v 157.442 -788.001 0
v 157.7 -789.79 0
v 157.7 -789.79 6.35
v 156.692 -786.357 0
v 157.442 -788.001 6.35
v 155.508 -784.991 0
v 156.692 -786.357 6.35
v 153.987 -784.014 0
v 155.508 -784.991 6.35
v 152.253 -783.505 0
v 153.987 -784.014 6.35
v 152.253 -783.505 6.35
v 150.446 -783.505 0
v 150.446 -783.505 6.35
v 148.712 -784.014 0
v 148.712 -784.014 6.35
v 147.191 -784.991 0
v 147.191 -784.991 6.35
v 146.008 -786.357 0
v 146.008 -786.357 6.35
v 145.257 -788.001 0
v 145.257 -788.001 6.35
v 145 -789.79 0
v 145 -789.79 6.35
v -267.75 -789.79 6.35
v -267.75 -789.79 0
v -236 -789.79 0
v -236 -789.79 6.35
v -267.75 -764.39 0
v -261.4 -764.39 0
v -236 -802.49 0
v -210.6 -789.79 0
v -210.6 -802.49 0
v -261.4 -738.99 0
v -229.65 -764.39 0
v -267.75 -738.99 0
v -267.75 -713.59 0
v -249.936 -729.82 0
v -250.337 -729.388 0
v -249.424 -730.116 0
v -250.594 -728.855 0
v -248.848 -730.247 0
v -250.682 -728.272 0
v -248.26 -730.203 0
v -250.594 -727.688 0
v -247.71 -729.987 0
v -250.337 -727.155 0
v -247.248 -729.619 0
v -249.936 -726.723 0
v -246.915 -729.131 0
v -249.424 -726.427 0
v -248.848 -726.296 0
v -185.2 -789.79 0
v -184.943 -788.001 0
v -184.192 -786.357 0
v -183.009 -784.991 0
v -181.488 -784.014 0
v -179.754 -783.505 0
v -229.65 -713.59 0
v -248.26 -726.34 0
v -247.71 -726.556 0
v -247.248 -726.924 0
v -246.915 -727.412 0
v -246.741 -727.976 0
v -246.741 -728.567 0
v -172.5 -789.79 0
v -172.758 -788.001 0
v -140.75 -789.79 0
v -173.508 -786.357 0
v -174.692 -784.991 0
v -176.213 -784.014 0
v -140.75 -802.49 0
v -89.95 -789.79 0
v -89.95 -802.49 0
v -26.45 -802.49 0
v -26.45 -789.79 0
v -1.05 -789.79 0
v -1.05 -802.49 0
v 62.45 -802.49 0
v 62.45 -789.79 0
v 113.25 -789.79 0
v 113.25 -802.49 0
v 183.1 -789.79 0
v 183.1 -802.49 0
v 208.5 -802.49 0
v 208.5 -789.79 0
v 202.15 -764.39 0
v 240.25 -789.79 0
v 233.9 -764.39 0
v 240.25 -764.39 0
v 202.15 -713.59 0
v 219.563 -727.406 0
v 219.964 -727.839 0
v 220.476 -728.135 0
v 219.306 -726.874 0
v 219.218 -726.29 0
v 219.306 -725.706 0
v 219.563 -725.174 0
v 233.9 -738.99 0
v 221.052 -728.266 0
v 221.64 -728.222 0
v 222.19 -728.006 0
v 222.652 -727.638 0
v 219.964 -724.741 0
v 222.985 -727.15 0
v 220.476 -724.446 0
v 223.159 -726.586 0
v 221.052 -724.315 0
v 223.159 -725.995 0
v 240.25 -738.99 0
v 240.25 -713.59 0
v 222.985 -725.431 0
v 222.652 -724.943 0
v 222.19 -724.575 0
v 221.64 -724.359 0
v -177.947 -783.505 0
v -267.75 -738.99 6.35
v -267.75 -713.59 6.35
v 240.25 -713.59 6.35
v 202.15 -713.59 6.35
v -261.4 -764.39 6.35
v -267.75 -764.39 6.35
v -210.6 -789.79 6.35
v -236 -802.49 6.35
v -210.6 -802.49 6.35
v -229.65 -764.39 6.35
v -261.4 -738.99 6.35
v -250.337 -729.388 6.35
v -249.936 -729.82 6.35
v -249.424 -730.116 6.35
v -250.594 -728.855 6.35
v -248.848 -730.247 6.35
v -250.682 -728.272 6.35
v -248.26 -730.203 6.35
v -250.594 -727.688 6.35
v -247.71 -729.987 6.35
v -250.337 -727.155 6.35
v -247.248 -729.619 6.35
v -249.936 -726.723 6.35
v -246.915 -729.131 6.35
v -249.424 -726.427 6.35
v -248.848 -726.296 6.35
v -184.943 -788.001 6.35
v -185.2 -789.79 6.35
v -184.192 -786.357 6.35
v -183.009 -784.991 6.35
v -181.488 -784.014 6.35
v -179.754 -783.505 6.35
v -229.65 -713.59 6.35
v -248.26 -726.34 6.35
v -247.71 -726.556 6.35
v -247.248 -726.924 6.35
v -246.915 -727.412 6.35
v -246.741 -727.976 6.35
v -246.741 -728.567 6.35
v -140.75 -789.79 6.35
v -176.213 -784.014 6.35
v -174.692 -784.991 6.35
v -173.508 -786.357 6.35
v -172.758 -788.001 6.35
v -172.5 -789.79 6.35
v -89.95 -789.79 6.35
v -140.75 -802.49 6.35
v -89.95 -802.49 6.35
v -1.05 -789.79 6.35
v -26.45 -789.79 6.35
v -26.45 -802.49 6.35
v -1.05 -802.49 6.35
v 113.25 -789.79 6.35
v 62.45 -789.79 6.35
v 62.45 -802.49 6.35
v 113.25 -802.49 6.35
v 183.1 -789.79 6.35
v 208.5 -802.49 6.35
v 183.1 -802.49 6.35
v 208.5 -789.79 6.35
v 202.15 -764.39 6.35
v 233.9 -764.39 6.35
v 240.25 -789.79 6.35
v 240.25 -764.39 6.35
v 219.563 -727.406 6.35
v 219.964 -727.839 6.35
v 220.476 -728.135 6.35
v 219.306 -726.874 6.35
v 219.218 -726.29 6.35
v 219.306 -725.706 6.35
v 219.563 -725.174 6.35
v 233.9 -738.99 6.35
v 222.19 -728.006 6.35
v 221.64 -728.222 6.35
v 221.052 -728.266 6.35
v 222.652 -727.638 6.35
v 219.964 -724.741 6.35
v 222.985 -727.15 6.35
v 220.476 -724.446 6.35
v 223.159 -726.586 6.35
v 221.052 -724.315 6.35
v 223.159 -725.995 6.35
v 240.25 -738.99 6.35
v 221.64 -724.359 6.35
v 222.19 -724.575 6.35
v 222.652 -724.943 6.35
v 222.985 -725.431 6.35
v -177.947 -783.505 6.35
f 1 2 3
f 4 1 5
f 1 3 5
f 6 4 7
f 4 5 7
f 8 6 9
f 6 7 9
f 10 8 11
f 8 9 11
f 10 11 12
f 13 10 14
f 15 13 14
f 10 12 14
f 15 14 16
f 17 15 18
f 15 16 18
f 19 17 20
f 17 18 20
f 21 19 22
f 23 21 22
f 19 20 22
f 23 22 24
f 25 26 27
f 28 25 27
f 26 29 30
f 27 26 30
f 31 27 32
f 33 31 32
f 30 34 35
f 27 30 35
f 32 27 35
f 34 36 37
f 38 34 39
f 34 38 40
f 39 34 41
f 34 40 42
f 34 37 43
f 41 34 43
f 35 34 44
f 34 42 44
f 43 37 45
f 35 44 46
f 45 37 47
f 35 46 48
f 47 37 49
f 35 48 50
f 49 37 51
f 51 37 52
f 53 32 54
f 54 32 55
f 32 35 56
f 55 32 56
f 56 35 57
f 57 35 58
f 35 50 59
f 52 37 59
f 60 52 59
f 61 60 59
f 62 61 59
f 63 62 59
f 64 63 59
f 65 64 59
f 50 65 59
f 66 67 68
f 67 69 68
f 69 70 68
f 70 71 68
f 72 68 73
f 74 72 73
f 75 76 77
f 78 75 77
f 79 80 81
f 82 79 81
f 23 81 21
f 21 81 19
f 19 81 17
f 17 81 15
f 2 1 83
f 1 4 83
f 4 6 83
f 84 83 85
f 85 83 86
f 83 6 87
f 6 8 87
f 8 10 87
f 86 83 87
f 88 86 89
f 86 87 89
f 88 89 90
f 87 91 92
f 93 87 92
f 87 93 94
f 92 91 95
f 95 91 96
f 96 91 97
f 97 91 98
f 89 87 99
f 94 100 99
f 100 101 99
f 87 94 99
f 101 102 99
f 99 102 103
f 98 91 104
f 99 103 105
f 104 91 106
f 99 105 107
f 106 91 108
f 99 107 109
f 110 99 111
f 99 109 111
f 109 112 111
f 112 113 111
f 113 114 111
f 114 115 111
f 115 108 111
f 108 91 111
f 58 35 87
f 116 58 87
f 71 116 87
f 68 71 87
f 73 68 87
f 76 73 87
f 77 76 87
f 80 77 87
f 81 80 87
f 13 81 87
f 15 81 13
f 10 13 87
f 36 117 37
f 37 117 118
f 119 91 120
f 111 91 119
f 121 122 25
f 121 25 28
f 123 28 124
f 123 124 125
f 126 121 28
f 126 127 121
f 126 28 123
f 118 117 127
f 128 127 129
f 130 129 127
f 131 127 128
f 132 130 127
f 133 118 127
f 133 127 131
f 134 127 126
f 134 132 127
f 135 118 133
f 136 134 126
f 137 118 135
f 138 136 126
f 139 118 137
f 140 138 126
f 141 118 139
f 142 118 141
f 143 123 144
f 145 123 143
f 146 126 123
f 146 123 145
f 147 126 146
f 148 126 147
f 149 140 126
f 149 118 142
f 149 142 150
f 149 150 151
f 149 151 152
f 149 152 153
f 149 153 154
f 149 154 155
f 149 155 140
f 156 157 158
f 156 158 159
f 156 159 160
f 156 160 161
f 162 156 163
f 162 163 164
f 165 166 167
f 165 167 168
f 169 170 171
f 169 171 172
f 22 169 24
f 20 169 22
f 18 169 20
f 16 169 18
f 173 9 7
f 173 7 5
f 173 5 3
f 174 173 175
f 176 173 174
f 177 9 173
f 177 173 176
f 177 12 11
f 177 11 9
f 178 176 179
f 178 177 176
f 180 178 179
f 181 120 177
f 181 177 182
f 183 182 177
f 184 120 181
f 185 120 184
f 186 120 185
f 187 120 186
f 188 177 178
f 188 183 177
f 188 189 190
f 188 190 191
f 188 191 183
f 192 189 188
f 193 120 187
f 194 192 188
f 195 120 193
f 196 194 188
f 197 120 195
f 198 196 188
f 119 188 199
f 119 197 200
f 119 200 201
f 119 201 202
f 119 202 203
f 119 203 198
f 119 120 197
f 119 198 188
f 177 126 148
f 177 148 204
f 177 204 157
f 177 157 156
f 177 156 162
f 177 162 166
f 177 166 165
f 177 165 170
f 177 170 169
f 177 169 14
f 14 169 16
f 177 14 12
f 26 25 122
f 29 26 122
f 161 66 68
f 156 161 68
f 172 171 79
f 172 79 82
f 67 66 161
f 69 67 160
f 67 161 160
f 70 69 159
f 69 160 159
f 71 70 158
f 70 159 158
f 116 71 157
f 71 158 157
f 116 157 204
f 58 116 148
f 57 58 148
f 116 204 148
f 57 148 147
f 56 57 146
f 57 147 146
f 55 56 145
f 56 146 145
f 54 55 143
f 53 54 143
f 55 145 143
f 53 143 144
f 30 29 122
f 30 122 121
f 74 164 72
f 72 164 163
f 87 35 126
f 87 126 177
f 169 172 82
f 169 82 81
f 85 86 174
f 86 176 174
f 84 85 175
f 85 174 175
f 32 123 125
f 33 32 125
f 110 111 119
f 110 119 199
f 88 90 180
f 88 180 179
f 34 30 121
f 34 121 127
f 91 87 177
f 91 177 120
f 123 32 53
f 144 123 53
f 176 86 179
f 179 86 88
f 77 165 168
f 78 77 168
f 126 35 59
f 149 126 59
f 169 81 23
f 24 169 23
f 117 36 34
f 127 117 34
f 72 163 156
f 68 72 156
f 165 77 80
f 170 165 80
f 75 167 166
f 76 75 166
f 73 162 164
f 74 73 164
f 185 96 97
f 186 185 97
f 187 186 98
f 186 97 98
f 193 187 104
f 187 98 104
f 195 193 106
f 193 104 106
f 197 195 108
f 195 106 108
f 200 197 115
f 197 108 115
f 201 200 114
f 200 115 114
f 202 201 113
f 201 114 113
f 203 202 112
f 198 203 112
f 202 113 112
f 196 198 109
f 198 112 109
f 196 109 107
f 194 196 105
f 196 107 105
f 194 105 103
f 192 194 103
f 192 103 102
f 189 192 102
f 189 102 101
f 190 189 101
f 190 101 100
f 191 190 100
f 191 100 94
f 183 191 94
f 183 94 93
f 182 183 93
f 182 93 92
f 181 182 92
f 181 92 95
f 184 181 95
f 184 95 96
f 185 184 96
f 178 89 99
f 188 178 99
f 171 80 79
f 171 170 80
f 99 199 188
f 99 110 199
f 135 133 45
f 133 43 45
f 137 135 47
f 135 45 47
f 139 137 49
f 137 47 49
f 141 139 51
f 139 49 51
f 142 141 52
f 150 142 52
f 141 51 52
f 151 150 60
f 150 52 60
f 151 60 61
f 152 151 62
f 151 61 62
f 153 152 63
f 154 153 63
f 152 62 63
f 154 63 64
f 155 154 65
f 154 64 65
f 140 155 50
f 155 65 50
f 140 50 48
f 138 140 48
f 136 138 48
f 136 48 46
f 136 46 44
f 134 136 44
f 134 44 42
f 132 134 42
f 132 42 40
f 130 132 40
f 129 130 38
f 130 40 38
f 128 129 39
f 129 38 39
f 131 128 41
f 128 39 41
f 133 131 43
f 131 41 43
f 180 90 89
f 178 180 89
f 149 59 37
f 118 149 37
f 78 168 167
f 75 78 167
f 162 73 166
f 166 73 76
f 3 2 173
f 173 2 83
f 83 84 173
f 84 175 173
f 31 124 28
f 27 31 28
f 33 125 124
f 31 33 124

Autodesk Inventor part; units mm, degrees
ref_plane "YZ Plane" through (0, 0, 0) normal (1, 0, 0) x (0, 1, 0)
ref_plane "XZ Plane" through (0, 0, 0) normal (0, 1, 0) x (-1, 0, 0)
ref_plane "XY Plane" through (0, 0, 0) normal (0, 0, 1) x (1, 0, 0)
sketch "Sketch1" plane through (0, 0, 0) normal (0, 0, 1) x (1, 0, 0)
  line L0 (-267.7504, 67.4597) -> (240.2496, 67.4597)
  line L1 (240.2496, 67.4597) -> (240.2496, -986.6403)
  line L2 (240.2496, -986.6403) -> (-267.7504, -986.6403)
  line L3 (-267.7504, -986.6403) -> (-267.7504, 67.4597)
  point P0 (0, 0)
  dimension "d0" = 508
  dimension "d1" = 1054.1
extrude "Extrusion1" add sketch "Sketch1" along normal blind 6.35
sketch "Sketch2" plane through (0, 0, 6.35) normal (0, 0, 1) x (1, 0, 0)
  line L0 (240.2496, -986.6403) -> (-267.7504, -986.6403) projected
  line L1 (-267.7504, -986.6403) -> (-13.7504, -986.6403)
  line L2 (-13.7504, -986.6403) -> (-13.7504, -980.2903)
  line L3 (-13.7504, -980.2903) -> (1.4896, -980.2903)
  line L4 (1.4896, -980.2903) -> (-28.9904, -980.2903)
  line L5 (-28.9904, -980.2903) -> (1.4896, -980.2903)
  line L6 (1.4896, -980.2903) -> (1.4896, -973.9403)
  line L7 (1.4896, -973.9403) -> (-28.9904, -973.9403)
  line L8 (-28.9904, -973.9403) -> (-28.9904, -980.2903)
  point P0 (0, 0)
  dimension "d4" = 254
  dimension "d5" = 6.35
  dimension "d6" = 15.24
  dimension "d7" = 30.48
  dimension "d8" = 6.35
extrude "Extrusion2" cut sketch "Sketch2" against normal blind 104.14
sketch "Sketch3" plane through (0, 0, 6.35) normal (0, 0, 1) x (1, 0, 0)
  line L0 (240.2496, -986.6403) -> (-267.7504, -986.6403) projected
  line L1 (1.4896, -980.2903) -> (14.1896, -980.2903)
  line L2 (-28.9904, -980.2903) -> (-41.6904, -980.2903)
  line L3 (-41.6904, -980.2903) -> (-67.0904, -980.2903)
  line L4 (-67.0904, -980.2903) -> (-67.0904, -973.9403)
  line L5 (-67.0904, -973.9403) -> (-41.6904, -973.9403)
  line L6 (-41.6904, -973.9403) -> (-41.6904, -980.2903)
  line L7 (14.1896, -980.2903) -> (39.5896, -980.2903)
  line L8 (39.5896, -980.2903) -> (39.5896, -973.9403)
  line L9 (39.5896, -973.9403) -> (14.1896, -973.9403)
  line L10 (14.1896, -973.9403) -> (14.1896, -980.2903)
  point P0 (0, 0)
  dimension "d11" = 12.7
  dimension "d12" = 12.7
  dimension "d13" = 25.4
  dimension "d14" = 25.4
extrude "Extrusion3" cut sketch "Sketch3" against normal blind 104.14
sketch "Sketch4" plane through (0, 0, 6.35) normal (0, 0, 1) x (1, 0, 0)
  line L0 (-67.0904, -973.9403) -> (-41.6904, -973.9403) projected
  line L1 (14.1896, -973.9403) -> (39.5896, -973.9403) projected
  line L2 (-28.9904, -973.9403) -> (1.4896, -973.9403) projected
  line L3 (240.2496, 67.4597) -> (240.2496, -986.6403) projected
  line L4 (-267.7504, -986.6403) -> (-267.7504, 67.4597) projected
  line L5 (240.2496, -986.6403) -> (-267.7504, -986.6403) projected
  line L6 (-67.0904, -980.2903) -> (-92.4904, -980.2903)
  line L7 (-92.4904, -980.2903) -> (-117.8904, -980.2903)
  line L8 (-117.8904, -980.2903) -> (-117.8904, -986.6403)
  line L9 (39.5896, -980.2903) -> (64.9896, -980.2903)
  line L10 (64.9896, -980.2903) -> (90.3896, -980.2903)
  line L11 (90.3896, -980.2903) -> (90.3896, -986.6403)
  line L12 (-41.6904, -973.9403) -> (-28.9904, -973.9403)
  line L13 (1.4896, -973.9403) -> (14.1896, -973.9403)
  line L14 (-67.0904, -973.9403) -> (-79.7904, -973.9403)
  line L15 (39.5896, -973.9403) -> (52.2896, -973.9403)
  line L16 (-79.7904, -973.9403) -> (-79.7904, -802.4903)
  line L17 (52.2896, -973.9403) -> (52.2896, -802.4903)
  line L18 (52.2896, -802.4903) -> (-79.7904, -802.4903)
  line L19 (-79.7904, -802.4903) -> (-105.1904, -802.4903)
  line L20 (-105.1904, -802.4903) -> (-105.1904, -815.1903)
  line L21 (-105.1904, -815.1903) -> (-92.4904, -815.1903)
  line L22 (-92.4904, -815.1903) -> (-92.4904, -980.2903)
  line L23 (64.9896, -980.2903) -> (64.9896, -815.1903)
  line L24 (64.9896, -815.1903) -> (77.6896, -815.1903)
  line L25 (77.6896, -815.1903) -> (77.6896, -802.4903)
  line L26 (77.6896, -802.4903) -> (52.2896, -802.4903)
  line L27 (-105.1904, -802.4903) -> (-267.7504, -802.4903)
  line L28 (77.6896, -802.4903) -> (240.2496, -802.4903)
  point P0 (0, 0)
  dimension "d17" = 25.4
  dimension "d18" = 25.4
  dimension "d19" = 25.4
  dimension "d20" = 25.4
  dimension "d21" = 171.45
  dimension "d22" = 25.4
  dimension "d23" = 12.7
extrude "Extrusion4" cut sketch "Sketch4" against normal blind 104.14 contours L14 L16 L18 L17 L15 L1 L13 L2 L12 L0 | L20 L21 L22 L7 L8 L5 L4 L27 | L28 L3 L5 L11 L10 L23 L24 L25
sketch "Sketch5" plane through (0, 0, 6.35) normal (0, 0, 1) x (1, 0, 0)
  line L0 (-92.4904, -815.1903) -> (-92.4904, -980.2903) projected
  line L1 (64.9896, -980.2903) -> (64.9896, -815.1903) projected
  line L2 (-92.4904, -973.9403) -> (-92.4904, -967.5903)
  line L3 (-92.4904, -967.5903) -> (-105.1904, -967.5903)
  line L4 (-105.1904, -967.5903) -> (-105.1904, -954.8903)
  line L5 (-105.1904, -954.8903) -> (-92.4904, -954.8903)
  line L6 (64.9896, -954.8903) -> (77.6896, -954.8903)
  line L7 (77.6896, -954.8903) -> (77.6896, -967.5903)
  line L8 (77.6896, -967.5903) -> (64.9896, -967.5903)
  point P0 (0, 0)
  dimension "d26" = 6.35
  dimension "d27" = 12.7
extrude "Extrusion5" add sketch "Sketch5" against normal blind 6.35
sketch "Sketch6" plane through (0, 0, 6.35) normal (0, 0, 1) x (1, 0, 0)
  line L0 (-79.7904, -802.4903) -> (52.2896, -802.4903) projected
  line L1 (-267.7504, -802.4903) -> (-105.1904, -802.4903) projected
  line L2 (77.6896, -802.4903) -> (240.2496, -802.4903) projected
  line L3 (-267.7504, -802.4903) -> (-242.3504, -802.4903)
  line L4 (-242.3504, -802.4903) -> (-216.9504, -802.4903)
  line L5 (-216.9504, -802.4903) -> (-140.7504, -802.4903)
  line L6 (-140.7504, -802.4903) -> (-115.3504, -802.4903)
  line L7 (-115.3504, -802.4903) -> (-39.1504, -802.4903)
  line L8 (-39.1504, -802.4903) -> (-13.7504, -802.4903)
  line L9 (-13.7504, -802.4903) -> (62.4496, -802.4903)
  line L10 (62.4496, -802.4903) -> (87.8496, -802.4903)
  line L11 (87.8496, -802.4903) -> (164.0496, -802.4903)
  line L12 (164.0496, -802.4903) -> (189.4496, -802.4903)
  line L13 (189.4496, -802.4903) -> (265.6496, -802.4903)
  line L14 (265.6496, -802.4903) -> (240.2496, -802.4903)
  line L15 (-242.3504, -802.4903) -> (-216.9504, -802.4903)
  line L16 (-216.9504, -802.4903) -> (-216.9504, -796.1403)
  line L17 (-216.9504, -796.1403) -> (-242.3504, -796.1403)
  line L18 (-242.3504, -796.1403) -> (-242.3504, -802.4903)
  line L19 (-140.7504, -802.4903) -> (-115.3504, -802.4903)
  line L20 (-115.3504, -802.4903) -> (-115.3504, -796.1403)
  line L21 (-115.3504, -796.1403) -> (-140.7504, -796.1403)
  line L22 (-140.7504, -796.1403) -> (-140.7504, -802.4903)
  line L23 (-39.1504, -802.4903) -> (-13.7504, -802.4903)
  line L24 (-13.7504, -802.4903) -> (-13.7504, -796.1403)
  line L25 (-13.7504, -796.1403) -> (-39.1504, -796.1403)
  line L26 (-39.1504, -796.1403) -> (-39.1504, -802.4903)
  line L27 (62.4496, -802.4903) -> (87.8496, -802.4903)
  line L28 (87.8496, -802.4903) -> (87.8496, -796.1403)
  line L29 (87.8496, -796.1403) -> (62.4496, -796.1403)
  line L30 (62.4496, -796.1403) -> (62.4496, -802.4903)
  line L31 (164.0496, -802.4903) -> (189.4496, -802.4903)
  line L32 (189.4496, -802.4903) -> (189.4496, -796.1403)
  line L33 (189.4496, -796.1403) -> (164.0496, -796.1403)
  line L34 (164.0496, -796.1403) -> (164.0496, -802.4903)
  point P0 (0, 0)
  dimension "d30" = 25.4
  dimension "d31" = 25.4
  dimension "d32" = 76.2
  dimension "d33" = 25.4
  dimension "d34" = 76.2
  dimension "d35" = 25.4
  dimension "d36" = 76.2
  dimension "d37" = 25.4
  dimension "d38" = 76.2
  dimension "d39" = 25.4
  dimension "d40" = 76.2
  dimension "d41" = 25.4
  dimension "d42" = 6.35
extrude "Extrusion6" cut sketch "Sketch6" against normal blind 25.4
sketch "Sketch7" plane through (0, 0, 6.35) normal (0, 0, 1) x (1, 0, 0)
  line L0 (-267.7504, -802.4903) -> (240.2496, -802.4903)
  line L1 (240.2496, -802.4903) -> (240.2496, -808.8403)
  line L2 (240.2496, -808.8403) -> (-267.7504, -808.8403)
  line L3 (-267.7504, -808.8403) -> (-267.7504, -802.4903)
  point P0 (0, 0)
extrude "Extrusion7" add sketch "Sketch7" against normal blind 6.35
sketch "Sketch8" plane through (0, 0, 6.35) normal (0, 0, 1) x (1, 0, 0)
  line L0 (-216.9504, -796.1403) -> (-191.5504, -796.1403)
  line L1 (-191.5504, -796.1403) -> (-191.5504, -789.7903)
  line L2 (-191.5504, -789.7903) -> (-216.9504, -789.7903)
  line L3 (-216.9504, -789.7903) -> (-216.9504, -796.1403)
  line L4 (-115.3504, -796.1403) -> (-89.9504, -796.1403)
  line L5 (-89.9504, -796.1403) -> (-89.9504, -789.7903)
  line L6 (-89.9504, -789.7903) -> (-115.3504, -789.7903)
  line L7 (-115.3504, -789.7903) -> (-115.3504, -796.1403)
  line L8 (-13.7504, -796.1403) -> (11.6496, -796.1403)
  line L9 (11.6496, -796.1403) -> (11.6496, -789.7903)
  line L10 (11.6496, -789.7903) -> (-13.7504, -789.7903)
  line L11 (-13.7504, -789.7903) -> (-13.7504, -796.1403)
  line L12 (87.8496, -796.1403) -> (113.2496, -796.1403)
  line L13 (113.2496, -796.1403) -> (113.2496, -789.7903)
  line L14 (113.2496, -789.7903) -> (87.8496, -789.7903)
  line L15 (87.8496, -789.7903) -> (87.8496, -796.1403)
  line L16 (189.4496, -796.1403) -> (214.8496, -796.1403)
  line L17 (214.8496, -796.1403) -> (214.8496, -789.7903)
  line L18 (214.8496, -789.7903) -> (189.4496, -789.7903)
  line L19 (189.4496, -789.7903) -> (189.4496, -796.1403)
  point P0 (0, 0)
  dimension "d47" = 25.4
  dimension "d48" = 6.35
  dimension "d49" = 25.4
  dimension "d50" = 25.4
  dimension "d51" = 25.4
  dimension "d52" = 25.4
extrude "Extrusion8" cut sketch "Sketch8" against normal blind 6.35
sketch "Sketch9" plane through (0, 0, 6.35) normal (0, 0, 1) x (1, 0, 0)
  circle A0 centre (-98.8404, -808.8403) radius 1.9812
  circle A1 centre (-98.8404, -961.2403) radius 1.9812
  circle A2 centre (71.3396, -961.2403) radius 1.9812
  circle A3 centre (71.3396, -808.8403) radius 1.9812
  point P0 (0, 0)
  dimension "d55" = 3.9624
  dimension "d56" = 3.9624
  dimension "d57" = 3.9624
  dimension "d58" = 3.9624
extrude "Extrusion9" cut sketch "Sketch9" against normal blind 6.35
sketch "Sketch10" plane through (0, 0, 0) normal (0, 0, -1) x (-1, 0, 0)
  line L0 (-77.6896, -815.1903) -> (-64.9896, -815.1903) projected
  line L1 (-64.9896, -815.1903) -> (-64.9896, -954.8903) projected
  line L2 (-77.6896, -954.8903) -> (-64.9896, -954.8903) projected
  line L3 (-64.9896, -967.5903) -> (-77.6896, -967.5903) projected
  line L4 (-64.9896, -967.5903) -> (-64.9896, -980.2903) projected
  line L5 (92.4904, -980.2903) -> (92.4904, -967.5903) projected
  line L6 (105.1904, -967.5903) -> (92.4904, -967.5903) projected
  line L7 (92.4904, -954.8903) -> (105.1904, -954.8903) projected
  line L8 (92.4904, -954.8903) -> (92.4904, -815.1903) projected
  line L9 (92.4904, -815.1903) -> (105.1904, -815.1903) projected
  line L10 (-77.6896, -808.8403) -> (-240.2496, -808.8403) projected
  line L11 (-77.6896, -815.1903) -> (-77.6896, -954.8903)
  line L12 (105.1904, -954.8903) -> (105.1904, -815.1903)
  line L13 (105.1904, -967.5903) -> (105.1904, -973.9403)
  line L14 (105.1904, -973.9403) -> (92.4904, -973.9403)
  line L15 (-77.6896, -967.5903) -> (-77.6896, -973.9403)
  line L16 (-77.6896, -973.9403) -> (-64.9896, -973.9403)
  point P0 (0, 0)
extrude "Extrusion10" add sketch "Sketch10" against normal blind 6.35
sketch "Sketch11" plane through (0, 0, 0) normal (0, 0, -1) x (-1, 0, 0)
  line L0 (79.7904, -808.8403) -> (79.7904, -973.9403) projected
  line L1 (79.7904, -973.9403) -> (67.0904, -973.9403) projected
  line L2 (-39.5896, -973.9403) -> (-52.2896, -973.9403) projected
  line L3 (-52.2896, -973.9403) -> (-52.2896, -808.8403) projected
  line L4 (-39.5896, -973.9403) -> (-52.2896, -961.2403)
  line L5 (67.0904, -973.9403) -> (79.7904, -961.2403)
  line L6 (-45.9396, -967.5903) -> (73.4404, -967.5903)
  line L7 (-39.5896, -973.9403) -> (67.0904, -973.9403)
  point P0 (0, 0)
extrude "Extrusion11" add sketch "Sketch11" against normal blind 6.35
sketch "Sketch12" plane through (0, 0, 0) normal (0, 0, -1) x (-1, 0, 0)
  line L0 (267.7504, -808.8403) -> (267.7504, 67.4597) projected
  line L1 (-240.2496, 67.4597) -> (-240.2496, -808.8403) projected
  line L2 (-240.2496, 67.4597) -> (-214.8496, 67.4597)
  line L3 (-214.8496, 67.4597) -> (-214.8496, 42.0597)
  line L4 (-214.8496, 42.0597) -> (-240.2496, 42.0597)
  line L5 (-240.2496, 42.0597) -> (-240.2496, 67.4597)
  line L6 (267.7504, 67.4597) -> (242.3504, 67.4597)
  line L7 (242.3504, 67.4597) -> (242.3504, 42.0597)
  line L8 (242.3504, 42.0597) -> (267.7504, 42.0597)
  line L9 (267.7504, 42.0597) -> (267.7504, 67.4597)
  line L10 (-240.2496, -789.7903) -> (-214.8496, -789.7903)
  line L11 (-214.8496, -789.7903) -> (-214.8496, -764.3903)
  line L12 (-214.8496, -764.3903) -> (-240.2496, -764.3903)
  line L13 (-240.2496, -764.3903) -> (-240.2496, -789.7903)
  line L14 (267.7504, -789.7903) -> (242.3504, -789.7903)
  line L15 (242.3504, -789.7903) -> (242.3504, -764.3903)
  line L16 (242.3504, -764.3903) -> (267.7504, -764.3903)
  line L17 (267.7504, -764.3903) -> (267.7504, -789.7903)
  line L18 (-214.8496, -764.3903) -> (242.3504, -764.3903)
  line L19 (242.3504, -764.3903) -> (242.3504, 42.0597)
  line L20 (242.3504, 42.0597) -> (-214.8496, 42.0597)
  line L21 (-214.8496, 42.0597) -> (-214.8496, -764.3903)
  point P0 (0, 0)
  dimension "d65" = 25.4
  dimension "d66" = 25.4
  dimension "d67" = 25.4
  dimension "d68" = 25.4
  dimension "d69" = 25.4
  dimension "d70" = 25.4
  dimension "d71" = 25.4
  dimension "d72" = 25.4
extrude "Extrusion12" cut sketch "Sketch12" against normal blind 6.35 contours L18 L21 L20 L19
fillet "Fillet1" radius 12.7 1 edges at (-242.3504, 42.0597, 3.175)
fillet "Fillet2" radius 12.7 3 edges at (214.8496, 42.0597, 3.175) (214.8496, -764.3903, 3.175) (-242.3504, -764.3903, 3.175)
sketch "Sketch13" plane through (0, 0, 0) normal (0, 0, -1) x (-1, 0, 0)
  line L0 (-214.8496, -751.6903) -> (-214.8496, 29.3597) projected
  arc A0 (-202.1496, 42.0597) -> (-214.8496, 29.3597) centre (-202.1496, 29.3597) ccw projected
  line L1 (-202.1496, 42.0597) -> (229.6504, 42.0597) projected
  arc A1 (242.3504, 29.3597) -> (229.6504, 42.0597) centre (229.6504, 29.3597) ccw projected
  line L2 (242.3504, 29.3597) -> (242.3504, -751.6903) projected
  arc A2 (229.6504, -764.3903) -> (242.3504, -751.6903) centre (229.6504, -751.6903) ccw projected
  arc A3 (-214.8496, -751.6903) -> (-202.1496, -764.3903) centre (-202.1496, -751.6903) ccw projected
  line L3 (267.7504, -808.8403) -> (267.7504, 67.4597) projected
  line L4 (267.7504, 67.4597) -> (-240.2496, 67.4597) projected
  line L5 (-240.2496, 67.4597) -> (-240.2496, -808.8403) projected
  line L6 (-202.1496, -764.3903) -> (-240.2496, -764.3903)
  line L7 (229.6504, -764.3903) -> (267.7504, -764.3903)
  point P0 (0, 0)
extrude "Extrusion13" cut sketch "Sketch13" against normal blind 25.4
sketch "Sketch14" plane through (0, 0, 0) normal (0, 0, -1) x (-1, 0, 0)
  line L0 (-240.2496, -764.3903) -> (-202.1496, -764.3903)
  line L1 (-202.1496, -764.3903) -> (-202.1496, -688.1903)
  line L2 (-202.1496, -688.1903) -> (-240.2496, -688.1903)
  line L3 (-240.2496, -688.1903) -> (-240.2496, -764.3903)
  line L4 (267.7504, -764.3903) -> (229.6504, -764.3903)
  line L5 (229.6504, -764.3903) -> (229.6504, -688.1903)
  line L6 (229.6504, -688.1903) -> (267.7504, -688.1903)
  line L7 (267.7504, -688.1903) -> (267.7504, -764.3903)
  point P0 (0, 0)
  dimension "d79" = 76.2
  dimension "d80" = 76.2
extrude "Extrusion14" add sketch "Sketch14" against normal blind 6.35
sketch "Sketch15" plane through (0, 0, 0) normal (0, 0, -1) x (-1, 0, 0)
  line L0 (-240.2496, -688.1903) -> (-221.1996, -688.1903)
  line L1 (-221.1996, -688.1903) -> (-221.1996, -707.2403)
  line L2 (-221.1996, -707.2403) -> (-240.2496, -707.2403)
  line L3 (-240.2496, -707.2403) -> (-240.2496, -688.1903)
  line L4 (267.7504, -688.1903) -> (248.7004, -688.1903)
  line L5 (248.7004, -688.1903) -> (248.7004, -707.2403)
  line L6 (248.7004, -707.2403) -> (267.7504, -707.2403)
  line L7 (267.7504, -707.2403) -> (267.7504, -688.1903)
  circle A0 centre (248.7004, -707.2403) radius 1.9812
  circle A1 centre (-221.1996, -707.2403) radius 1.9812
  point P0 (0, 0)
  dimension "d83" = 19.05
  dimension "d84" = 19.05
  dimension "d85" = 19.05
  dimension "d86" = 19.05
  dimension "d87" = 3.9624
  dimension "d88" = 3.9624
extrude "Extrusion15" cut sketch "Sketch15" against normal blind 6.35 contours A1 L2 L1 | L1 L2 A1 | A0 L6 L5 | L5 L6 A0
sketch "Sketch16" plane through (0, 0, 0) normal (0, 0, -1) x (-1, 0, 0)
  line L0 (-240.2496, -688.1903) -> (-240.2496, -808.8403) projected
  line L1 (-240.2496, -688.1903) -> (-233.8996, -688.1903)
  line L2 (-233.8996, -688.1903) -> (-233.8996, -713.5903)
  line L3 (-233.8996, -713.5903) -> (-240.2496, -713.5903)
  line L4 (-240.2496, -713.5903) -> (-240.2496, -688.1903)
  line L5 (-233.8996, -713.5903) -> (-240.2496, -713.5903)
  line L6 (-240.2496, -713.5903) -> (-240.2496, -738.9903)
  line L7 (-240.2496, -738.9903) -> (-233.8996, -738.9903)
  line L8 (-233.8996, -738.9903) -> (-233.8996, -713.5903)
  line L9 (-233.8996, -738.9903) -> (-240.2496, -738.9903)
  line L10 (-240.2496, -738.9903) -> (-240.2496, -764.3903)
  line L11 (-240.2496, -764.3903) -> (-233.8996, -764.3903)
  line L12 (-233.8996, -764.3903) -> (-233.8996, -738.9903)
  line L13 (-233.8996, -764.3903) -> (-240.2496, -764.3903)
  line L14 (-240.2496, -764.3903) -> (-240.2496, -789.7903)
  line L15 (-240.2496, -789.7903) -> (-233.8996, -789.7903)
  line L16 (-233.8996, -789.7903) -> (-233.8996, -764.3903)
  point P0 (0, 0)
  dimension "d91" = 6.35
  dimension "d92" = 25.4
  dimension "d93" = 25.4
  dimension "d94" = 25.4
extrude "Extrusion16" cut sketch "Sketch16" against normal blind 6.35 contours L1 L2 L3 L0 | L7 L12 L11 L0
sketch "Sketch17" plane through (0, 0, 0) normal (0, 0, -1) x (-1, 0, 0)
  line L0 (267.7504, -808.8403) -> (267.7504, -688.1903) projected
  line L1 (267.7504, -688.1903) -> (261.4004, -688.1903)
  line L2 (261.4004, -688.1903) -> (261.4004, -713.5903)
  line L3 (261.4004, -713.5903) -> (267.7504, -713.5903)
  line L4 (267.7504, -713.5903) -> (267.7504, -688.1903)
  line L5 (261.4004, -713.5903) -> (267.7504, -713.5903)
  line L6 (267.7504, -713.5903) -> (267.7504, -738.9903)
  line L7 (267.7504, -738.9903) -> (261.4004, -738.9903)
  line L8 (261.4004, -738.9903) -> (261.4004, -713.5903)
  line L9 (261.4004, -738.9903) -> (267.7504, -738.9903)
  line L10 (267.7504, -738.9903) -> (267.7504, -764.3903)
  line L11 (267.7504, -764.3903) -> (261.4004, -764.3903)
  line L12 (261.4004, -764.3903) -> (261.4004, -738.9903)
  point P0 (0, 0)
  dimension "d97" = 6.35
  dimension "d98" = 25.4
  dimension "d99" = 25.4
  dimension "d100" = 25.4
extrude "Extrusion17" cut sketch "Sketch17" against normal blind 6.35 contours L11 L12 L7 L0 | L3 L2 L1 L0
sketch "Sketch18" plane through (0, 0, 0) normal (0, 0, -1) x (-1, 0, 0)
  circle A0 centre (-221.1996, -707.2403) radius 1.9812 projected
  circle A1 centre (248.7004, -707.2403) radius 1.9812 projected
  line L0 (-233.8996, -688.1903) -> (261.4004, -688.1903)
  line L1 (261.4004, -688.1903) -> (261.4004, -713.5903)
  line L2 (261.4004, -713.5903) -> (-233.8996, -713.5903)
  line L3 (-233.8996, -713.5903) -> (-233.8996, -688.1903)
  point P0 (0, 0)
extrude "Extrusion18" cut sketch "Sketch18" against normal blind 25.4
sketch "Sketch19" plane through (0, 0, 0) normal (0, 0, -1) x (-1, 0, 0)
  line L0 (-202.1496, -713.5903) -> (-221.1996, -713.5903)
  line L1 (-221.1996, -713.5903) -> (-221.1996, -726.2903)
  line L2 (-221.1996, -726.2903) -> (-202.1496, -726.2903)
  line L3 (-202.1496, -726.2903) -> (-202.1496, -713.5903)
  circle A0 centre (-221.1996, -726.2903) radius 1.9812
  circle A1 centre (248.7004, -728.2715) radius 1.9812
  point P0 (0, 0)
  dimension "d105" = 19.05
  dimension "d106" = 12.7
  dimension "d107" = 3.9624
  dimension "d108" = 3.9624
extrude "Extrusion19" cut sketch "Sketch19" against normal blind 25.4 contours A0 L2 L1 | L1 L2 A0 | A1
sketch "Sketch20" plane through (0, 0, 0) normal (0, 0, -1) x (-1, 0, 0)
  line L0 (-214.8496, -789.7903) -> (242.3504, -789.7903)
  line L1 (242.3504, -789.7903) -> (242.3504, -802.4903)
  line L2 (242.3504, -802.4903) -> (-214.8496, -802.4903)
  line L3 (-214.8496, -802.4903) -> (-214.8496, -789.7903)
  point P0 (0, 0)
extrude "Extrusion20" add sketch "Sketch20" against normal blind 6.35
sketch "Sketch21" plane through (0, 0, 0) normal (0, 0, -1) x (-1, 0, 0)
  line L0 (-240.2496, -808.8403) -> (-227.5496, -808.8403)
  line L1 (-227.5496, -808.8403) -> (-227.5496, -796.1403)
  line L2 (-227.5496, -796.1403) -> (-240.2496, -796.1403)
  line L3 (-240.2496, -796.1403) -> (-240.2496, -808.8403)
  line L4 (-227.5496, -796.1403) -> (-202.1496, -796.1403)
  line L5 (-202.1496, -796.1403) -> (-202.1496, -789.7903)
  line L6 (-202.1496, -789.7903) -> (-227.5496, -789.7903)
  line L7 (-227.5496, -789.7903) -> (-227.5496, -796.1403)
  line L8 (-202.1496, -796.1403) -> (-176.7496, -796.1403)
  line L9 (-176.7496, -796.1403) -> (-176.7496, -802.4903)
  line L10 (-176.7496, -802.4903) -> (-202.1496, -802.4903)
  line L11 (-202.1496, -802.4903) -> (-202.1496, -796.1403)
  line L12 (-176.7496, -796.1403) -> (-151.3496, -796.1403)
  line L13 (-151.3496, -796.1403) -> (-151.3496, -802.4903)
  line L14 (-151.3496, -802.4903) -> (-176.7496, -802.4903)
  line L15 (-176.7496, -802.4903) -> (-176.7496, -796.1403)
  line L16 (-151.3496, -796.1403) -> (-125.9496, -796.1403)
  line L17 (-125.9496, -796.1403) -> (-125.9496, -802.4903)
  line L18 (-125.9496, -802.4903) -> (-151.3496, -802.4903)
  line L19 (-151.3496, -802.4903) -> (-151.3496, -796.1403)
  line L20 (-125.9496, -796.1403) -> (-100.5496, -796.1403)
  line L21 (-100.5496, -796.1403) -> (-100.5496, -789.7903)
  line L22 (-100.5496, -789.7903) -> (-125.9496, -789.7903)
  line L23 (-125.9496, -789.7903) -> (-125.9496, -796.1403)
  line L24 (-100.5496, -796.1403) -> (-75.1496, -796.1403)
  line L25 (-75.1496, -796.1403) -> (-75.1496, -802.4903)
  line L26 (-75.1496, -802.4903) -> (-100.5496, -802.4903)
  line L27 (-100.5496, -802.4903) -> (-100.5496, -796.1403)
  line L28 (-75.1496, -802.4903) -> (-49.7496, -802.4903)
  line L29 (-49.7496, -802.4903) -> (-49.7496, -796.1403)
  line L30 (-49.7496, -796.1403) -> (-75.1496, -796.1403)
  line L31 (-75.1496, -796.1403) -> (-75.1496, -802.4903)
  line L32 (-49.7496, -796.1403) -> (-24.3496, -796.1403)
  line L33 (-24.3496, -796.1403) -> (-24.3496, -802.4903)
  line L34 (-24.3496, -802.4903) -> (-49.7496, -802.4903)
  line L35 (-49.7496, -802.4903) -> (-49.7496, -796.1403)
  line L36 (-24.3496, -796.1403) -> (1.0504, -796.1403)
  line L37 (1.0504, -796.1403) -> (1.0504, -789.7903)
  line L38 (1.0504, -789.7903) -> (-24.3496, -789.7903)
  line L39 (-24.3496, -789.7903) -> (-24.3496, -796.1403)
  line L40 (1.0504, -796.1403) -> (26.4504, -796.1403)
  line L41 (26.4504, -796.1403) -> (26.4504, -802.4903)
  line L42 (26.4504, -802.4903) -> (1.0504, -802.4903)
  line L43 (1.0504, -802.4903) -> (1.0504, -796.1403)
  line L44 (26.4504, -796.1403) -> (51.8504, -796.1403)
  line L45 (51.8504, -796.1403) -> (51.8504, -802.4903)
  line L46 (51.8504, -802.4903) -> (26.4504, -802.4903)
  line L47 (26.4504, -802.4903) -> (26.4504, -796.1403)
  line L48 (51.8504, -796.1403) -> (77.2504, -796.1403)
  line L49 (77.2504, -796.1403) -> (77.2504, -802.4903)
  line L50 (77.2504, -802.4903) -> (51.8504, -802.4903)
  line L51 (51.8504, -802.4903) -> (51.8504, -796.1403)
  line L52 (77.2504, -796.1403) -> (102.6504, -796.1403)
  line L53 (102.6504, -796.1403) -> (102.6504, -789.7903)
  line L54 (102.6504, -789.7903) -> (77.2504, -789.7903)
  line L55 (77.2504, -789.7903) -> (77.2504, -796.1403)
  line L56 (102.6504, -796.1403) -> (128.0504, -796.1403)
  line L57 (128.0504, -796.1403) -> (128.0504, -802.4903)
  line L58 (128.0504, -802.4903) -> (102.6504, -802.4903)
  line L59 (102.6504, -802.4903) -> (102.6504, -796.1403)
  line L60 (128.0504, -796.1403) -> (153.4504, -796.1403)
  line L61 (153.4504, -796.1403) -> (153.4504, -802.4903)
  line L62 (153.4504, -802.4903) -> (128.0504, -802.4903)
  line L63 (128.0504, -802.4903) -> (128.0504, -796.1403)
  line L64 (153.4504, -796.1403) -> (178.8504, -796.1403)
  line L65 (178.8504, -796.1403) -> (178.8504, -802.4903)
  line L66 (178.8504, -802.4903) -> (153.4504, -802.4903)
  line L67 (153.4504, -802.4903) -> (153.4504, -796.1403)
  line L68 (178.8504, -796.1403) -> (204.2504, -796.1403)
  line L69 (204.2504, -796.1403) -> (204.2504, -789.7903)
  line L70 (204.2504, -789.7903) -> (178.8504, -789.7903)
  line L71 (178.8504, -789.7903) -> (178.8504, -796.1403)
  line L72 (204.2504, -796.1403) -> (229.6504, -796.1403)
  line L73 (229.6504, -796.1403) -> (229.6504, -802.4903)
  line L74 (229.6504, -802.4903) -> (204.2504, -802.4903)
  line L75 (204.2504, -802.4903) -> (204.2504, -796.1403)
  line L76 (229.6504, -796.1403) -> (255.0504, -796.1403)
  line L77 (255.0504, -796.1403) -> (255.0504, -802.4903)
  line L78 (255.0504, -802.4903) -> (229.6504, -802.4903)
  line L79 (229.6504, -802.4903) -> (229.6504, -796.1403)
  point P0 (0, 0)
  dimension "d113" = 12.7
  dimension "d114" = 12.7
  dimension "d115" = 25.4
  dimension "d116" = 6.35
  dimension "d117" = 25.4
  dimension "d118" = 25.4
  dimension "d119" = 25.4
  dimension "d120" = 25.4
  dimension "d121" = 25.4
  dimension "d122" = 25.4
  dimension "d123" = 25.4
  dimension "d124" = 25.4
  dimension "d125" = 25.4
  dimension "d126" = 25.4
  dimension "d127" = 25.4
  dimension "d128" = 25.4
  dimension "d129" = 25.4
  dimension "d130" = 25.4
  dimension "d131" = 25.4
  dimension "d132" = 25.4
  dimension "d133" = 25.4
  dimension "d134" = 25.4
extrude "Extrusion21" cut sketch "Sketch21" against normal blind 6.35 contours L71 L70 L69 L68 | L55 L54 L53 L52 | L39 L38 L37 L36 | L23 L22 L21 L20 | L7 L6 L5 L4 | L12 L13 L14 L9 | L30 L29 L28 L25 | L44 L45 L46 L41 | L60 L61 L62 L57 | L76 L77 L78 L73
sketch "Sketch22" plane through (0, 0, 0) normal (0, 0, -1) x (-1, 0, 0)
  line L0 (-240.2496, -764.3903) -> (-240.2496, -808.8403) projected
  line L1 (267.7504, -808.8403) -> (267.7504, -764.3903) projected
  line L2 (-227.5496, -789.7903) -> (-240.2496, -789.7903)
  line L3 (-240.2496, -789.7903) -> (-240.2496, -802.4903)
  line L4 (-240.2496, -802.4903) -> (-227.5496, -802.4903)
  line L5 (-227.5496, -802.4903) -> (-227.5496, -789.7903)
  line L6 (255.0504, -802.4903) -> (267.7504, -802.4903)
  line L7 (267.7504, -802.4903) -> (267.7504, -789.7903)
  line L8 (267.7504, -789.7903) -> (255.0504, -789.7903)
  line L9 (255.0504, -789.7903) -> (255.0504, -802.4903)
  point P0 (0, 0)
extrude "Extrusion22" cut sketch "Sketch22" against normal blind 6.35
sketch "Sketch23" plane through (0, 0, 6.35) normal (0, 0, 1) x (1, 0, 0)
  line L0 (-229.6504, -802.4903) -> (-267.7504, -802.4903) projected
  line L1 (-267.7504, -808.8403) -> (-267.7504, -802.4903) projected
  line L2 (-267.7504, -808.8403) -> (-105.1904, -808.8403) projected
  line L3 (-105.1904, -808.8403) -> (-105.1904, -973.9403) projected
  line L4 (-92.4904, -973.9403) -> (-105.1904, -973.9403) projected
  line L5 (-92.4904, -973.9403) -> (-92.4904, -980.2903) projected
  line L6 (-92.4904, -980.2903) -> (-117.8904, -980.2903) projected
  line L7 (-117.8904, -980.2903) -> (-117.8904, -986.6403) projected
  line L8 (90.3896, -986.6403) -> (-117.8904, -986.6403) projected
  line L9 (90.3896, -986.6403) -> (90.3896, -980.2903) projected
  line L10 (90.3896, -980.2903) -> (64.9896, -980.2903) projected
  line L11 (64.9896, -980.2903) -> (64.9896, -973.9403) projected
  line L12 (77.6896, -973.9403) -> (64.9896, -973.9403) projected
  line L13 (77.6896, -973.9403) -> (77.6896, -808.8403) projected
  line L14 (77.6896, -808.8403) -> (240.2496, -808.8403) projected
  line L15 (240.2496, -802.4903) -> (240.2496, -808.8403) projected
  line L16 (240.2496, -802.4903) -> (227.5496, -802.4903) projected
  line L17 (227.5496, -802.4903) -> (227.5496, -796.1403) projected
  line L18 (227.5496, -796.1403) -> (202.1496, -796.1403) projected
  line L19 (202.1496, -796.1403) -> (202.1496, -789.7903) projected
  line L20 (202.1496, -789.7903) -> (240.2496, -789.7903) projected
  line L21 (240.2496, -764.3903) -> (240.2496, -789.7903) projected
  line L22 (240.2496, -764.3903) -> (233.8996, -764.3903) projected
  line L23 (233.8996, -764.3903) -> (233.8996, -738.9903) projected
  line L24 (233.8996, -738.9903) -> (240.2496, -738.9903) projected
  line L25 (240.2496, -713.5903) -> (240.2496, -738.9903) projected
  line L26 (240.2496, -713.5903) -> (202.1496, -713.5903) projected
  line L27 (202.1496, -764.3903) -> (202.1496, -713.5903) projected
  line L28 (202.1496, -764.3903) -> (-229.6504, -764.3903) projected
  line L29 (-229.6504, -713.5903) -> (-229.6504, -764.3903) projected
  line L30 (-229.6504, -713.5903) -> (-267.7504, -713.5903) projected
  line L31 (-267.7504, -738.9903) -> (-267.7504, -713.5903) projected
  line L32 (-267.7504, -738.9903) -> (-261.4004, -738.9903) projected
  line L33 (-261.4004, -738.9903) -> (-261.4004, -764.3903) projected
  line L34 (-261.4004, -764.3903) -> (-267.7504, -764.3903) projected
  line L35 (-267.7504, -789.7903) -> (-267.7504, -764.3903) projected
  line L36 (-267.7504, -789.7903) -> (-255.0504, -789.7903) projected
  line L37 (-255.0504, -789.7903) -> (-255.0504, -796.1403) projected
  line L38 (-255.0504, -796.1403) -> (-229.6504, -796.1403) projected
  line L39 (-229.6504, -796.1403) -> (-229.6504, -802.4903) projected
  line L40 (49.7496, -802.4903) -> (49.7496, -796.1403) projected
  line L41 (49.7496, -796.1403) -> (75.1496, -796.1403) projected
  line L42 (75.1496, -796.1403) -> (75.1496, -802.4903) projected
  line L43 (75.1496, -802.4903) -> (49.7496, -802.4903) projected
  line L44 (-204.2504, -796.1403) -> (-204.2504, -789.7903) projected
  line L45 (-204.2504, -789.7903) -> (-178.8504, -789.7903) projected
  line L46 (-178.8504, -789.7903) -> (-178.8504, -796.1403) projected
  line L47 (-178.8504, -796.1403) -> (-204.2504, -796.1403) projected
  line L48 (-128.0504, -802.4903) -> (-153.4504, -802.4903) projected
  line L49 (-153.4504, -802.4903) -> (-153.4504, -796.1403) projected
  line L50 (-153.4504, -796.1403) -> (-128.0504, -796.1403) projected
  line L51 (-128.0504, -796.1403) -> (-128.0504, -802.4903) projected
  line L52 (-102.6504, -796.1403) -> (-102.6504, -789.7903) projected
  line L53 (-102.6504, -789.7903) -> (-77.2504, -789.7903) projected
  line L54 (-77.2504, -789.7903) -> (-77.2504, -796.1403) projected
  line L55 (-77.2504, -796.1403) -> (-102.6504, -796.1403) projected
  line L56 (-26.4504, -802.4903) -> (-51.8504, -802.4903) projected
  line L57 (-51.8504, -802.4903) -> (-51.8504, -796.1403) projected
  line L58 (-51.8504, -796.1403) -> (-26.4504, -796.1403) projected
  line L59 (-26.4504, -796.1403) -> (-26.4504, -802.4903) projected
  line L60 (-1.0504, -796.1403) -> (-1.0504, -789.7903) projected
  line L61 (-1.0504, -789.7903) -> (24.3496, -789.7903) projected
  line L62 (24.3496, -789.7903) -> (24.3496, -796.1403) projected
  line L63 (24.3496, -796.1403) -> (-1.0504, -796.1403) projected
  line L64 (100.5496, -796.1403) -> (100.5496, -789.7903) projected
  line L65 (100.5496, -789.7903) -> (125.9496, -789.7903) projected
  line L66 (125.9496, -789.7903) -> (125.9496, -796.1403) projected
  line L67 (125.9496, -796.1403) -> (100.5496, -796.1403) projected
  line L68 (176.7496, -802.4903) -> (151.3496, -802.4903) projected
  line L69 (151.3496, -802.4903) -> (151.3496, -796.1403) projected
  line L70 (151.3496, -796.1403) -> (176.7496, -796.1403) projected
  line L71 (176.7496, -796.1403) -> (176.7496, -802.4903) projected
  line L72 (1.4896, -973.9403) -> (-28.9904, -973.9403) projected
  line L73 (1.4896, -973.9403) -> (1.4896, -980.2903) projected
  line L74 (1.4896, -980.2903) -> (-28.9904, -980.2903) projected
  line L75 (-28.9904, -980.2903) -> (-28.9904, -973.9403) projected
  circle A0 centre (71.3396, -808.8403) radius 1.9812 projected
  circle A1 centre (-98.8404, -808.8403) radius 1.9812 projected
  circle A2 centre (71.3396, -961.2403) radius 1.9812 projected
  circle A3 centre (-98.8404, -961.2403) radius 1.9812 projected
  line L76 (-41.6904, -973.9403) -> (-67.0904, -973.9403) projected
  line L77 (-41.6904, -973.9403) -> (-41.6904, -980.2903) projected
  line L78 (-41.6904, -980.2903) -> (-67.0904, -980.2903) projected
  line L79 (-67.0904, -980.2903) -> (-67.0904, -973.9403) projected
  line L80 (39.5896, -973.9403) -> (39.5896, -980.2903) projected
  line L81 (39.5896, -980.2903) -> (14.1896, -980.2903) projected
  line L82 (14.1896, -980.2903) -> (14.1896, -973.9403) projected
  line L83 (39.5896, -973.9403) -> (14.1896, -973.9403) projected
  line L84 (-79.7904, -961.2403) -> (-79.7904, -808.8403) projected
  line L85 (-79.7904, -808.8403) -> (52.2896, -808.8403) projected
  line L86 (52.2896, -808.8403) -> (52.2896, -961.2403) projected
  line L87 (45.9396, -967.5903) -> (52.2896, -961.2403) projected
  line L88 (-73.4404, -967.5903) -> (45.9396, -967.5903) projected
  line L89 (-79.7904, -961.2403) -> (-73.4404, -967.5903) projected
  line L90 (-255.0504, -789.7903) -> (240.2496, -789.7903)
  point P0 (0, 0)
extrude "Extrusion23" cut sketch "Sketch23" against normal blind 25.4 contours L39 L38 L37 L90 L44 L47 L46 L52 L55 L54 L60 L63 L62 L64 L67 L66 L19 L18 L17 L16 L15 L14 L13 L12 L11 L10 L9 L8 L7 L6 L5 L4 L3 L2 L1 L0
sketch "Sketch24" plane through (0, 0, 6.35) normal (0, 0, 1) x (1, 0, 0)
  line L0 (-267.7504, -789.7903) -> (240.2496, -789.7903) projected
  line L1 (-267.7504, -789.7903) -> (-236.0004, -789.7903)
  line L2 (-236.0004, -789.7903) -> (-210.6004, -789.7903)
  line L3 (-210.6004, -789.7903) -> (-210.6004, -796.1403)
  line L4 (-210.6004, -796.1403) -> (-236.0004, -796.1403)
  line L5 (-236.0004, -796.1403) -> (-236.0004, -789.7903)
  line L6 (240.2496, -789.7903) -> (214.8496, -789.7903)
  line L7 (214.8496, -789.7903) -> (208.4996, -789.7903)
  line L8 (208.4996, -789.7903) -> (183.0996, -789.7903)
  line L9 (183.0996, -789.7903) -> (183.0996, -796.1403)
  line L10 (183.0996, -796.1403) -> (208.4996, -796.1403)
  line L11 (208.4996, -796.1403) -> (208.4996, -789.7903)
  line L12 (-210.6004, -789.7903) -> (-128.0504, -789.7903)
  line L13 (-128.0504, -789.7903) -> (-102.6504, -789.7903)
  line L14 (-102.6504, -789.7903) -> (-102.6504, -796.1403)
  line L15 (-102.6504, -796.1403) -> (-128.0504, -796.1403)
  line L16 (-128.0504, -796.1403) -> (-128.0504, -789.7903)
  line L17 (-102.6504, -789.7903) -> (-26.4504, -789.7903)
  line L18 (-26.4504, -789.7903) -> (-1.0504, -789.7903)
  line L19 (-1.0504, -789.7903) -> (-1.0504, -796.1403)
  line L20 (-1.0504, -796.1403) -> (-26.4504, -796.1403)
  line L21 (-26.4504, -796.1403) -> (-26.4504, -789.7903)
  line L22 (-1.0504, -789.7903) -> (24.3496, -789.7903)
  line L23 (24.3496, -789.7903) -> (75.1496, -789.7903)
  line L24 (75.1496, -789.7903) -> (100.5496, -789.7903)
  line L25 (100.5496, -789.7903) -> (100.5496, -796.1403)
  line L26 (100.5496, -796.1403) -> (75.1496, -796.1403)
  line L27 (75.1496, -796.1403) -> (75.1496, -789.7903)
  line L28 (100.5496, -789.7903) -> (183.0996, -789.7903)
  point P0 (0, 0)
  dimension "d141" = 31.75
  dimension "d142" = 25.4
  dimension "d143" = 6.35
  dimension "d144" = 25.4
  dimension "d145" = 6.35
  dimension "d146" = 25.4
  dimension "d147" = 82.55
  dimension "d148" = 25.4
  dimension "d149" = 76.2
  dimension "d150" = 25.4
  dimension "d151" = 25.4
  dimension "d152" = 50.8
  dimension "d153" = 25.4
extrude "Extrusion24" add sketch "Sketch24" against normal blind 6.35
sketch "Sketch25" plane through (0, 0, 6.35) normal (0, 0, 1) x (1, 0, 0)
  line L0 (-236.0004, -796.1403) -> (-210.6004, -796.1403)
  line L1 (-210.6004, -796.1403) -> (-210.6004, -802.4903)
  line L2 (-210.6004, -802.4903) -> (-236.0004, -802.4903)
  line L3 (-236.0004, -802.4903) -> (-236.0004, -796.1403)
  line L4 (-128.0504, -796.1403) -> (-102.6504, -796.1403)
  line L5 (-102.6504, -796.1403) -> (-102.6504, -802.4903)
  line L6 (-102.6504, -802.4903) -> (-128.0504, -802.4903)
  line L7 (-128.0504, -802.4903) -> (-128.0504, -796.1403)
  line L8 (-26.4504, -796.1403) -> (-1.0504, -796.1403)
  line L9 (-1.0504, -796.1403) -> (-1.0504, -802.4903)
  line L10 (-1.0504, -802.4903) -> (-26.4504, -802.4903)
  line L11 (-26.4504, -802.4903) -> (-26.4504, -796.1403)
  line L12 (75.1496, -796.1403) -> (100.5496, -796.1403)
  line L13 (100.5496, -796.1403) -> (100.5496, -802.4903)
  line L14 (100.5496, -802.4903) -> (75.1496, -802.4903)
  line L15 (75.1496, -802.4903) -> (75.1496, -796.1403)
  point P0 (0, 0)
  dimension "d156" = 6.35
extrude "Extrusion25" add sketch "Sketch25" against normal blind 6.35
sketch "Sketch26" plane through (0, 0, 6.35) normal (0, 0, 1) x (1, 0, 0)
  line L0 (183.0996, -796.1403) -> (208.4996, -796.1403)
  line L1 (208.4996, -796.1403) -> (208.4996, -802.4903)
  line L2 (208.4996, -802.4903) -> (183.0996, -802.4903)
  line L3 (183.0996, -802.4903) -> (183.0996, -796.1403)
  point P0 (0, 0)
extrude "Extrusion26" add sketch "Sketch26" against normal blind 6.35
sketch "Sketch27" plane through (0, 0, 6.35) normal (0, 0, 1) x (1, 0, 0)
  line L0 (-210.6004, -789.7903) -> (-128.0504, -789.7903) projected
  line L1 (100.5496, -789.7903) -> (183.0996, -789.7903) projected
  line L2 (-128.0504, -789.7903) -> (-140.7504, -789.7903)
  line L3 (100.5496, -789.7903) -> (113.2496, -789.7903)
  line L4 (-140.7504, -789.7903) -> (-89.9504, -789.7903)
  line L5 (-89.9504, -789.7903) -> (-89.9504, -802.4903)
  line L6 (-89.9504, -802.4903) -> (-140.7504, -802.4903)
  line L7 (-140.7504, -802.4903) -> (-140.7504, -789.7903)
  line L8 (113.2496, -789.7903) -> (62.4496, -789.7903)
  line L9 (62.4496, -789.7903) -> (62.4496, -802.4903)
  line L10 (62.4496, -802.4903) -> (113.2496, -802.4903)
  line L11 (113.2496, -802.4903) -> (113.2496, -789.7903)
  point P0 (0, 0)
  dimension "d161" = 12.7
  dimension "d162" = 12.7
  dimension "d163" = 50.8
  dimension "d164" = 50.8
extrude "Extrusion27" add sketch "Sketch27" against normal blind 6.35
sketch "Sketch28" plane through (0, 0, 6.35) normal (0, 0, 1) x (1, 0, 0)
  line L0 (113.2496, -789.7903) -> (183.0996, -789.7903) projected
  line L1 (-210.6004, -789.7903) -> (-140.7504, -789.7903) projected
  line L2 (-210.6004, -789.7903) -> (-178.8504, -789.7903)
  circle A0 centre (-178.8504, -789.7903) radius 6.35
  line L3 (183.0996, -789.7903) -> (151.3496, -789.7903)
  circle A1 centre (151.3496, -789.7903) radius 6.35
  point P0 (0, 0)
  dimension "d167" = 31.75
  dimension "d168" = 12.7
  dimension "d169" = 31.75
  dimension "d170" = 12.7
extrude "Extrusion28" cut sketch "Sketch28" against normal blind 6.35
properties part number "base front"
